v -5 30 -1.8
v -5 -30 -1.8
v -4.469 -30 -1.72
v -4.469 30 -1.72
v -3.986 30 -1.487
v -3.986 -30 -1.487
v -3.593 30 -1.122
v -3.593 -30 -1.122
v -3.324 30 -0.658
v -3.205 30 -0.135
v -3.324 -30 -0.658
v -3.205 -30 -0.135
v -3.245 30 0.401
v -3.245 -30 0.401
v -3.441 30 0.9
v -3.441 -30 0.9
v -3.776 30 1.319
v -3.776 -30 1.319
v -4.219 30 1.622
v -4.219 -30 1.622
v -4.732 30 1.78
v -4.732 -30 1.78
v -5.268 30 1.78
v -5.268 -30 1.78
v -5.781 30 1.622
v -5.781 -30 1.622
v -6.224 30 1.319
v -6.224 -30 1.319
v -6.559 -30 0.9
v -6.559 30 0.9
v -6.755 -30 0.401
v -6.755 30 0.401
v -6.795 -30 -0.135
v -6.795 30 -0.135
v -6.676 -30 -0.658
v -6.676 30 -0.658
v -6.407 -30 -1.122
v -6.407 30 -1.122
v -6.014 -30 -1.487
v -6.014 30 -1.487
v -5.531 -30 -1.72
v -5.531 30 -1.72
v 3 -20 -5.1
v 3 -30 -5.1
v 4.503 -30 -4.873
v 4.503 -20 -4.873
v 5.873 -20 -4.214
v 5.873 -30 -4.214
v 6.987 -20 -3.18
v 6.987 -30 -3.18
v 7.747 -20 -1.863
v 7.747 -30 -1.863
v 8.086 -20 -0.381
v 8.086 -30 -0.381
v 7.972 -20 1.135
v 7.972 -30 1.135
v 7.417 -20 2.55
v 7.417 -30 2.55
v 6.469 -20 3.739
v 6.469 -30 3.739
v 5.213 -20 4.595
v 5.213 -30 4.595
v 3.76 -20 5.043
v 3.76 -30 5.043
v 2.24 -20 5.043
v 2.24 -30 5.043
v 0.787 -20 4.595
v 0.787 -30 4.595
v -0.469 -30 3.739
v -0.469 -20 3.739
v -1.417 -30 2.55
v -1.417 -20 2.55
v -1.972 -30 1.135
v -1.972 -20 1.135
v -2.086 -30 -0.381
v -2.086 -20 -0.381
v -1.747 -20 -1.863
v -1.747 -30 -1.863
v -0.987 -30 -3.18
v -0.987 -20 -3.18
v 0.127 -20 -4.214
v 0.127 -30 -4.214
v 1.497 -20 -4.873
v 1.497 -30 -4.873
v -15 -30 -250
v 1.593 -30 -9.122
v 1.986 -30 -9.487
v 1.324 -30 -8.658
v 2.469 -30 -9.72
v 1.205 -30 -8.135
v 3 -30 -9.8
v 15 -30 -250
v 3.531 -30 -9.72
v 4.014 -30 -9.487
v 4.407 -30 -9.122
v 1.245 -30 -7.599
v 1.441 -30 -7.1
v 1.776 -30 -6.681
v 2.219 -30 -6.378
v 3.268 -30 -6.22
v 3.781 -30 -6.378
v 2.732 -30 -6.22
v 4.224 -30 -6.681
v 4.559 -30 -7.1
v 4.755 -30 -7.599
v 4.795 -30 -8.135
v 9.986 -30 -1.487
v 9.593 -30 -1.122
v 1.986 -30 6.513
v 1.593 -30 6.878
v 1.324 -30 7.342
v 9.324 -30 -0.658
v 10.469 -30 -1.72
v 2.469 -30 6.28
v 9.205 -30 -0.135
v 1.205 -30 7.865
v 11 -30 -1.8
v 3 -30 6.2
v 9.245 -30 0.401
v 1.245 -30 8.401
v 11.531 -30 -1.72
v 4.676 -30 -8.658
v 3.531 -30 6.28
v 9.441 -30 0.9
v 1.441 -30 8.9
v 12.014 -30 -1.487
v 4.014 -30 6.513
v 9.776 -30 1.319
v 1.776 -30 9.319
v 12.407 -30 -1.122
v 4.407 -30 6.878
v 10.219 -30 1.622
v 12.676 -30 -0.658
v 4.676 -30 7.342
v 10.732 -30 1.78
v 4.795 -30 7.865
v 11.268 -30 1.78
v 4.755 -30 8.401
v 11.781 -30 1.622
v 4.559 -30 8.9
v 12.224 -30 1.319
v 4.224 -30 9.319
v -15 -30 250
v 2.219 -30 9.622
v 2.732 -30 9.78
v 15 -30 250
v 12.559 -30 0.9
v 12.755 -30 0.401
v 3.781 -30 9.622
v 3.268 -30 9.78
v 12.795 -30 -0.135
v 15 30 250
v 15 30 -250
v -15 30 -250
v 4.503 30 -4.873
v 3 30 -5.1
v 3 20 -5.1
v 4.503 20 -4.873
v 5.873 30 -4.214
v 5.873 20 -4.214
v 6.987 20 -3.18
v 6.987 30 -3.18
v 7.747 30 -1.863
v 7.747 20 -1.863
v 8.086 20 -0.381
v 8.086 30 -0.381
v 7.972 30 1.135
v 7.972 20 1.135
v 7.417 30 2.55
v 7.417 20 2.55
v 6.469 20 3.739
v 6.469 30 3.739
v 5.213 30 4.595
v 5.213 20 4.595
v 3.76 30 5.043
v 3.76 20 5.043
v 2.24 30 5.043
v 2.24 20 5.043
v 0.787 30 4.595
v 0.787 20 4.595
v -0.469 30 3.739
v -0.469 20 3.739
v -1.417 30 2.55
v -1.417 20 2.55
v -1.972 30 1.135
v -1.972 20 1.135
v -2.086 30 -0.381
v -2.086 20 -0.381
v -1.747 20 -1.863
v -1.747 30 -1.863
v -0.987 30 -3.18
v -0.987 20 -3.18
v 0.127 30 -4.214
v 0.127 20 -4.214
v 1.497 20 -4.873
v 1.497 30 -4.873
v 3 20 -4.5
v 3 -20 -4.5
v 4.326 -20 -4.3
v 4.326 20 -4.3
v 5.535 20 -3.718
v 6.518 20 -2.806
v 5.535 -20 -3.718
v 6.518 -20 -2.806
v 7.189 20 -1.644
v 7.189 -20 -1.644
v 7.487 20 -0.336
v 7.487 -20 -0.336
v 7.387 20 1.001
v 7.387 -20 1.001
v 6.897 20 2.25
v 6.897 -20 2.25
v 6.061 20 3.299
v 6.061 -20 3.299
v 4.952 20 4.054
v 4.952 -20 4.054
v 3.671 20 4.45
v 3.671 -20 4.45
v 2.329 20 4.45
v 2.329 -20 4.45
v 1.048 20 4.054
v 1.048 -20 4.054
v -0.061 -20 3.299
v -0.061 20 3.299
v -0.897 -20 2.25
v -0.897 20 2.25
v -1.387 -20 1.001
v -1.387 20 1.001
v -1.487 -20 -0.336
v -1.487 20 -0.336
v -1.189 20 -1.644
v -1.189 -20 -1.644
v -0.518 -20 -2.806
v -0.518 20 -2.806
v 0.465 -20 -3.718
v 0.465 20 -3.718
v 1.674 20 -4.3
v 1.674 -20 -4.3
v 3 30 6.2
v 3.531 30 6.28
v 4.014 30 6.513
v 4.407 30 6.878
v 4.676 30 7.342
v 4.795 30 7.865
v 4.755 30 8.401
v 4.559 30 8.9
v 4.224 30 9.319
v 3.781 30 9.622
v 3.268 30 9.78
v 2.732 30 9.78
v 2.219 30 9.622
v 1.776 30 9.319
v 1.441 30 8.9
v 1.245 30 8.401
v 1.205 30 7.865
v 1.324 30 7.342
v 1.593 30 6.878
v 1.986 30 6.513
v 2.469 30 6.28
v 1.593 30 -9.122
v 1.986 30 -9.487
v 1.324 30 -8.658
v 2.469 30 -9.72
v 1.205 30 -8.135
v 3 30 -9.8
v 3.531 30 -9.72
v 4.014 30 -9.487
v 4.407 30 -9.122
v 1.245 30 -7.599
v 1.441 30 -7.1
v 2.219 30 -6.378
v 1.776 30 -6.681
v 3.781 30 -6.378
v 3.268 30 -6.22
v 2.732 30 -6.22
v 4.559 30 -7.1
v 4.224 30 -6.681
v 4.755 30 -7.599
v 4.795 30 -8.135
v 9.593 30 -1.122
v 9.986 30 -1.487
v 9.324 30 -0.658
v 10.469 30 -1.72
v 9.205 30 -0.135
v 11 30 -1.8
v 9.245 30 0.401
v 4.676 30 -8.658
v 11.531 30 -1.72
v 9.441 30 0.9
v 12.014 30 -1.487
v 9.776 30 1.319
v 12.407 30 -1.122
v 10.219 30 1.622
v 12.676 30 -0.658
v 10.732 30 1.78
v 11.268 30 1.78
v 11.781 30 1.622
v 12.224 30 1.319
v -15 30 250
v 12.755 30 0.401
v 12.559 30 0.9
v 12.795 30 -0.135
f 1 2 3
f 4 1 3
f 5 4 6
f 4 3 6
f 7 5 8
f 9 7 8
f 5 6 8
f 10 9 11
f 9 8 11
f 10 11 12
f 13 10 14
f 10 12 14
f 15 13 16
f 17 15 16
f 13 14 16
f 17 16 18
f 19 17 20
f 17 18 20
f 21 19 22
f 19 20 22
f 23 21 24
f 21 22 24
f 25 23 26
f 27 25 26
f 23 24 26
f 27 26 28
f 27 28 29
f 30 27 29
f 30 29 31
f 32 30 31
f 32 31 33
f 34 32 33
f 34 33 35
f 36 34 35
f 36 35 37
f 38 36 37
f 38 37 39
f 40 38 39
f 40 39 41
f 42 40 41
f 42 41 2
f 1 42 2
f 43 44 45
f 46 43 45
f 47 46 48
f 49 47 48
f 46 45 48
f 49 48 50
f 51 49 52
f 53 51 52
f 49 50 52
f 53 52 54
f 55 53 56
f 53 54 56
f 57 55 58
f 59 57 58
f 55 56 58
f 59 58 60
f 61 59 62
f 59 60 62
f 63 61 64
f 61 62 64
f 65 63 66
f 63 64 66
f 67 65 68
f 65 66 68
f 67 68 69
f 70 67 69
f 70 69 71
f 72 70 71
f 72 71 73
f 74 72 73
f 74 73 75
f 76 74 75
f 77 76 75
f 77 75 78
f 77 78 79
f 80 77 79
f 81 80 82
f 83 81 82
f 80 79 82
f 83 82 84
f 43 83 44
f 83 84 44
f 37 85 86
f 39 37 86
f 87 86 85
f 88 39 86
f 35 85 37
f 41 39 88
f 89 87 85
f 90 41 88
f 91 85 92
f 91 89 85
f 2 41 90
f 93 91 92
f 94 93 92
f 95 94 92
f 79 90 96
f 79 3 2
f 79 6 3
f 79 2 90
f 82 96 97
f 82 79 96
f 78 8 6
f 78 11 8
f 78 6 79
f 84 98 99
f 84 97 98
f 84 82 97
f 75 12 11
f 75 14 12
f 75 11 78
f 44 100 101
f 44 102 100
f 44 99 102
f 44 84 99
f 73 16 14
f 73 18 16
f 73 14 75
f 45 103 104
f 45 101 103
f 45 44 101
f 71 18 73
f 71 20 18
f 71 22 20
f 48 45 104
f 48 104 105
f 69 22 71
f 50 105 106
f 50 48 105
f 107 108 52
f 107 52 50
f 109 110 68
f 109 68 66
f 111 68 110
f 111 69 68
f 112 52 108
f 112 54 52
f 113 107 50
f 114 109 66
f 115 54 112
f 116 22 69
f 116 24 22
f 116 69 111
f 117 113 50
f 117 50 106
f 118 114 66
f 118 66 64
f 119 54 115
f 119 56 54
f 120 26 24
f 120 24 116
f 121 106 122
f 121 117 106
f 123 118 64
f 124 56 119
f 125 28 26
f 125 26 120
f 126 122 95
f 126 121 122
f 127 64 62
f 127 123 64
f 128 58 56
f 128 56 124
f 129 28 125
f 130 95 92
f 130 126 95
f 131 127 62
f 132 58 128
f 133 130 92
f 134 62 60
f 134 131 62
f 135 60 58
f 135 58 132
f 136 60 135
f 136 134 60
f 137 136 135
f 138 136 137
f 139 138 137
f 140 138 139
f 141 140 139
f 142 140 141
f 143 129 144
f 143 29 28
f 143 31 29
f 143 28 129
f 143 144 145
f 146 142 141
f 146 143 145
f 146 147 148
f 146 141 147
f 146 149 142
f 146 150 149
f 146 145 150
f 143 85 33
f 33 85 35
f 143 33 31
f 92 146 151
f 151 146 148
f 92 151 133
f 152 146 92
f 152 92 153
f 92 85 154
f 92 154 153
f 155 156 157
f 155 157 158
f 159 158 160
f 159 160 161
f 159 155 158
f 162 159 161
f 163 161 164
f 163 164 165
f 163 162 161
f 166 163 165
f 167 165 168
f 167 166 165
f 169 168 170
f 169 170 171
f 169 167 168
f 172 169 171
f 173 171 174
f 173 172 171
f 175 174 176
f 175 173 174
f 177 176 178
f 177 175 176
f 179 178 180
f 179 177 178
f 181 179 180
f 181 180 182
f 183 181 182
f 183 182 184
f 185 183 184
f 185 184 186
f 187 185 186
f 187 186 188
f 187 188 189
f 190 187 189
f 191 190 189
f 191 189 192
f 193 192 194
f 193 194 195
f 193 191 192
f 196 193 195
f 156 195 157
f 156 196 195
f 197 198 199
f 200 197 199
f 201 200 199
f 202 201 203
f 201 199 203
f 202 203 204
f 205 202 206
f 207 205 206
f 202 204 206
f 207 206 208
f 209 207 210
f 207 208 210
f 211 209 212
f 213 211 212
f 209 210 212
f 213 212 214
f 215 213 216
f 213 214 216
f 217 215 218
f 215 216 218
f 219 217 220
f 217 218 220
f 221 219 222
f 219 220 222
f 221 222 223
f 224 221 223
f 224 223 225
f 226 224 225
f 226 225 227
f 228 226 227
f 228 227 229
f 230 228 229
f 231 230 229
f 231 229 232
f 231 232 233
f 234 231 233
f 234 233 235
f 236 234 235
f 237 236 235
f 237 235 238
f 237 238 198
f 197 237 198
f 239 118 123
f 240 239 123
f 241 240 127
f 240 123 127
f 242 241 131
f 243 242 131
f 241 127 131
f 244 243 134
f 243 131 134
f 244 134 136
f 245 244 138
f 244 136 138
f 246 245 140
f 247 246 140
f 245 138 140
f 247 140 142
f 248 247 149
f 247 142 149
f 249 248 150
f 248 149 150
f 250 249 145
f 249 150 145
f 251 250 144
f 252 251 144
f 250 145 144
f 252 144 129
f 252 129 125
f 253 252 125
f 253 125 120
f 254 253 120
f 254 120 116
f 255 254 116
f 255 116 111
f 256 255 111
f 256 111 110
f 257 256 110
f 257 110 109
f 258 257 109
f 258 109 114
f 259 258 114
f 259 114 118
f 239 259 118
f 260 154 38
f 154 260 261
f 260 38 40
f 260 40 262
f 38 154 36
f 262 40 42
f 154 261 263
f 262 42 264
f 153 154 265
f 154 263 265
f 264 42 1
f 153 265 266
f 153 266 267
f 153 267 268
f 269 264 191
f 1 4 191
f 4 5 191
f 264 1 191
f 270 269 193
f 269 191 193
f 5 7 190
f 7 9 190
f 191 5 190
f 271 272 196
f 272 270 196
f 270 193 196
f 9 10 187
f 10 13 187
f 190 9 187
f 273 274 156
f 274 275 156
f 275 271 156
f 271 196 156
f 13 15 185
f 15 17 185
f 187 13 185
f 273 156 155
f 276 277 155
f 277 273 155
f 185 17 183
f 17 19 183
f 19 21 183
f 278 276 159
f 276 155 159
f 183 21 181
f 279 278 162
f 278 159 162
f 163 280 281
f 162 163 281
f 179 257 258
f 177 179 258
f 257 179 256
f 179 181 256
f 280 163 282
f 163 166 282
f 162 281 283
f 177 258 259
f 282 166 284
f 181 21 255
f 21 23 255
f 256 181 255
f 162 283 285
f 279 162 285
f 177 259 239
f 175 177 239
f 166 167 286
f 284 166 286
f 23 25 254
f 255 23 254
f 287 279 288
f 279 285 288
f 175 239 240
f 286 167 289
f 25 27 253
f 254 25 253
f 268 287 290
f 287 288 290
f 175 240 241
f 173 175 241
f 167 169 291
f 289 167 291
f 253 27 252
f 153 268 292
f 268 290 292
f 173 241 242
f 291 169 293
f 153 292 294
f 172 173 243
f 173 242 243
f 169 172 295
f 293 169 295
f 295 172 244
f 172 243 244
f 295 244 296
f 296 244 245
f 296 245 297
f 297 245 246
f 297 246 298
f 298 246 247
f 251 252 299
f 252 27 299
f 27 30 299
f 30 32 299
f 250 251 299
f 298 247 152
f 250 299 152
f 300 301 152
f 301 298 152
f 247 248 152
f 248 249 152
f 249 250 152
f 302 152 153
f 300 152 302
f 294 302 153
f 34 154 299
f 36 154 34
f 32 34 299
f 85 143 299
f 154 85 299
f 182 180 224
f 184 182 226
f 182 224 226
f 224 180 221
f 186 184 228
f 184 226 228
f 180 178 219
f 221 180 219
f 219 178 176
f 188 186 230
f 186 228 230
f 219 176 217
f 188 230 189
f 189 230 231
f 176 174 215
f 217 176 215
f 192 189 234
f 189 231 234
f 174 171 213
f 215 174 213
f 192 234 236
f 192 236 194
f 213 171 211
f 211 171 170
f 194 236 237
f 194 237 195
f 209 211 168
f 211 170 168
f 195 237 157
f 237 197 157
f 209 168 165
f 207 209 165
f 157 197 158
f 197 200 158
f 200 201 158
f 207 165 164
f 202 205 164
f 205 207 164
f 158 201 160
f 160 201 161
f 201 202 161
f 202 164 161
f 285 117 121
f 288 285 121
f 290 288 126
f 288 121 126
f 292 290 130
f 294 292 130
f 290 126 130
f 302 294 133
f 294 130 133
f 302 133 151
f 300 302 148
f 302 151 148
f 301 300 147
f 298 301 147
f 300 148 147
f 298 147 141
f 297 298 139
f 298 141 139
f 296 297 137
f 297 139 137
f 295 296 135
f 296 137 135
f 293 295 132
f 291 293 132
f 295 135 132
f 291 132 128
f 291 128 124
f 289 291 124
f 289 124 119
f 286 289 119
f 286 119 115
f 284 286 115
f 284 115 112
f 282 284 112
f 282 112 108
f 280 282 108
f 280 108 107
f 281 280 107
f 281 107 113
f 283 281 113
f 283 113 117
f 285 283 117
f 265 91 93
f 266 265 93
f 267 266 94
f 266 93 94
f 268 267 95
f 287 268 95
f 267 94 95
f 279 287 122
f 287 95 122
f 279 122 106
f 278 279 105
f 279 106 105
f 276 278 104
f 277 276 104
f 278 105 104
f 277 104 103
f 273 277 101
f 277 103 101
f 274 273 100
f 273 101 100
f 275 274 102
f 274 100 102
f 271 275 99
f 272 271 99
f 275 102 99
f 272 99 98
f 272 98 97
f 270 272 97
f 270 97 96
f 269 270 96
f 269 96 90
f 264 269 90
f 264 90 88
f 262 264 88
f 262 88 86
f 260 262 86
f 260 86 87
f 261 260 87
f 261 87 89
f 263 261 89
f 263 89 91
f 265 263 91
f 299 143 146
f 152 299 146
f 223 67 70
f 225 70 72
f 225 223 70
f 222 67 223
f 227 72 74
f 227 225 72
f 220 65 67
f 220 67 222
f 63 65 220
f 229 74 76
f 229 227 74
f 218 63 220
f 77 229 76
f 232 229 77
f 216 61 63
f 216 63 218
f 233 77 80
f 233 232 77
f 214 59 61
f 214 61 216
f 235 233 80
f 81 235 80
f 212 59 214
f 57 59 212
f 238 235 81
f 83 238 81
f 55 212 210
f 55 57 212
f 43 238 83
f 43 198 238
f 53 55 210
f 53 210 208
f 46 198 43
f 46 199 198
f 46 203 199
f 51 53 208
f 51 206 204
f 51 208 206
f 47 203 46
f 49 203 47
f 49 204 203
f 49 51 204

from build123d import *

# Parameters (mm, degrees)
SKETCH1_W           = 30
SKETCH1_H           = 60
BOSS_EXTRUDE1_DEPTH = 250
SKETCH3_R           = 4.5
SKETCH3_R_2         = 1.8
CUT_EXTRUDE1_DEPTH  = 258.536405194
SKETCH4_R           = 5.1
CUT_EXTRUDE2_DEPTH  = 10


with BuildPart() as part:
    # Sketch1 → Boss-Extrude1 (new, symmetric)
    with BuildSketch(Plane.XY):
        Rectangle(SKETCH1_W, SKETCH1_H)
    extrude(amount=BOSS_EXTRUDE1_DEPTH, both=True)

    # Sketch3 → Cut-Extrude1 (cut, through all)
    with BuildSketch(Plane.XZ.offset(30)):
        with Locations(Location((3, 0, 0), (0, 0, 270))):
            Circle(SKETCH3_R)
        with Locations(Location((11, 0, 0), (0, 0, 270))):
            Circle(SKETCH3_R_2)
        with Locations(Location((3, -8, 0), (0, 0, 270))):
            Circle(SKETCH3_R_2)
        with Locations(Location((-5, 0, 0), (0, 0, 270))):
            Circle(SKETCH3_R_2)
        with Locations(Location((3, 8, 0), (0, 0, 270))):
            Circle(SKETCH3_R_2)
    extrude(amount=-CUT_EXTRUDE1_DEPTH, mode=Mode.SUBTRACT)

    # Sketch4 → Cut-Extrude2 (cut)
    with BuildSketch(Plane.XZ.offset(30)):
        with Locations(Location((3, 0, 0), (0, 0, 270))):
            Circle(SKETCH4_R)
    cut_extrude2 = extrude(amount=-CUT_EXTRUDE2_DEPTH, mode=Mode.SUBTRACT)

    # Mirror1: Cut-Extrude2 across plane
    add(cut_extrude2.mirror(Plane.ZX), mode=Mode.SUBTRACT)


solid = part.part
